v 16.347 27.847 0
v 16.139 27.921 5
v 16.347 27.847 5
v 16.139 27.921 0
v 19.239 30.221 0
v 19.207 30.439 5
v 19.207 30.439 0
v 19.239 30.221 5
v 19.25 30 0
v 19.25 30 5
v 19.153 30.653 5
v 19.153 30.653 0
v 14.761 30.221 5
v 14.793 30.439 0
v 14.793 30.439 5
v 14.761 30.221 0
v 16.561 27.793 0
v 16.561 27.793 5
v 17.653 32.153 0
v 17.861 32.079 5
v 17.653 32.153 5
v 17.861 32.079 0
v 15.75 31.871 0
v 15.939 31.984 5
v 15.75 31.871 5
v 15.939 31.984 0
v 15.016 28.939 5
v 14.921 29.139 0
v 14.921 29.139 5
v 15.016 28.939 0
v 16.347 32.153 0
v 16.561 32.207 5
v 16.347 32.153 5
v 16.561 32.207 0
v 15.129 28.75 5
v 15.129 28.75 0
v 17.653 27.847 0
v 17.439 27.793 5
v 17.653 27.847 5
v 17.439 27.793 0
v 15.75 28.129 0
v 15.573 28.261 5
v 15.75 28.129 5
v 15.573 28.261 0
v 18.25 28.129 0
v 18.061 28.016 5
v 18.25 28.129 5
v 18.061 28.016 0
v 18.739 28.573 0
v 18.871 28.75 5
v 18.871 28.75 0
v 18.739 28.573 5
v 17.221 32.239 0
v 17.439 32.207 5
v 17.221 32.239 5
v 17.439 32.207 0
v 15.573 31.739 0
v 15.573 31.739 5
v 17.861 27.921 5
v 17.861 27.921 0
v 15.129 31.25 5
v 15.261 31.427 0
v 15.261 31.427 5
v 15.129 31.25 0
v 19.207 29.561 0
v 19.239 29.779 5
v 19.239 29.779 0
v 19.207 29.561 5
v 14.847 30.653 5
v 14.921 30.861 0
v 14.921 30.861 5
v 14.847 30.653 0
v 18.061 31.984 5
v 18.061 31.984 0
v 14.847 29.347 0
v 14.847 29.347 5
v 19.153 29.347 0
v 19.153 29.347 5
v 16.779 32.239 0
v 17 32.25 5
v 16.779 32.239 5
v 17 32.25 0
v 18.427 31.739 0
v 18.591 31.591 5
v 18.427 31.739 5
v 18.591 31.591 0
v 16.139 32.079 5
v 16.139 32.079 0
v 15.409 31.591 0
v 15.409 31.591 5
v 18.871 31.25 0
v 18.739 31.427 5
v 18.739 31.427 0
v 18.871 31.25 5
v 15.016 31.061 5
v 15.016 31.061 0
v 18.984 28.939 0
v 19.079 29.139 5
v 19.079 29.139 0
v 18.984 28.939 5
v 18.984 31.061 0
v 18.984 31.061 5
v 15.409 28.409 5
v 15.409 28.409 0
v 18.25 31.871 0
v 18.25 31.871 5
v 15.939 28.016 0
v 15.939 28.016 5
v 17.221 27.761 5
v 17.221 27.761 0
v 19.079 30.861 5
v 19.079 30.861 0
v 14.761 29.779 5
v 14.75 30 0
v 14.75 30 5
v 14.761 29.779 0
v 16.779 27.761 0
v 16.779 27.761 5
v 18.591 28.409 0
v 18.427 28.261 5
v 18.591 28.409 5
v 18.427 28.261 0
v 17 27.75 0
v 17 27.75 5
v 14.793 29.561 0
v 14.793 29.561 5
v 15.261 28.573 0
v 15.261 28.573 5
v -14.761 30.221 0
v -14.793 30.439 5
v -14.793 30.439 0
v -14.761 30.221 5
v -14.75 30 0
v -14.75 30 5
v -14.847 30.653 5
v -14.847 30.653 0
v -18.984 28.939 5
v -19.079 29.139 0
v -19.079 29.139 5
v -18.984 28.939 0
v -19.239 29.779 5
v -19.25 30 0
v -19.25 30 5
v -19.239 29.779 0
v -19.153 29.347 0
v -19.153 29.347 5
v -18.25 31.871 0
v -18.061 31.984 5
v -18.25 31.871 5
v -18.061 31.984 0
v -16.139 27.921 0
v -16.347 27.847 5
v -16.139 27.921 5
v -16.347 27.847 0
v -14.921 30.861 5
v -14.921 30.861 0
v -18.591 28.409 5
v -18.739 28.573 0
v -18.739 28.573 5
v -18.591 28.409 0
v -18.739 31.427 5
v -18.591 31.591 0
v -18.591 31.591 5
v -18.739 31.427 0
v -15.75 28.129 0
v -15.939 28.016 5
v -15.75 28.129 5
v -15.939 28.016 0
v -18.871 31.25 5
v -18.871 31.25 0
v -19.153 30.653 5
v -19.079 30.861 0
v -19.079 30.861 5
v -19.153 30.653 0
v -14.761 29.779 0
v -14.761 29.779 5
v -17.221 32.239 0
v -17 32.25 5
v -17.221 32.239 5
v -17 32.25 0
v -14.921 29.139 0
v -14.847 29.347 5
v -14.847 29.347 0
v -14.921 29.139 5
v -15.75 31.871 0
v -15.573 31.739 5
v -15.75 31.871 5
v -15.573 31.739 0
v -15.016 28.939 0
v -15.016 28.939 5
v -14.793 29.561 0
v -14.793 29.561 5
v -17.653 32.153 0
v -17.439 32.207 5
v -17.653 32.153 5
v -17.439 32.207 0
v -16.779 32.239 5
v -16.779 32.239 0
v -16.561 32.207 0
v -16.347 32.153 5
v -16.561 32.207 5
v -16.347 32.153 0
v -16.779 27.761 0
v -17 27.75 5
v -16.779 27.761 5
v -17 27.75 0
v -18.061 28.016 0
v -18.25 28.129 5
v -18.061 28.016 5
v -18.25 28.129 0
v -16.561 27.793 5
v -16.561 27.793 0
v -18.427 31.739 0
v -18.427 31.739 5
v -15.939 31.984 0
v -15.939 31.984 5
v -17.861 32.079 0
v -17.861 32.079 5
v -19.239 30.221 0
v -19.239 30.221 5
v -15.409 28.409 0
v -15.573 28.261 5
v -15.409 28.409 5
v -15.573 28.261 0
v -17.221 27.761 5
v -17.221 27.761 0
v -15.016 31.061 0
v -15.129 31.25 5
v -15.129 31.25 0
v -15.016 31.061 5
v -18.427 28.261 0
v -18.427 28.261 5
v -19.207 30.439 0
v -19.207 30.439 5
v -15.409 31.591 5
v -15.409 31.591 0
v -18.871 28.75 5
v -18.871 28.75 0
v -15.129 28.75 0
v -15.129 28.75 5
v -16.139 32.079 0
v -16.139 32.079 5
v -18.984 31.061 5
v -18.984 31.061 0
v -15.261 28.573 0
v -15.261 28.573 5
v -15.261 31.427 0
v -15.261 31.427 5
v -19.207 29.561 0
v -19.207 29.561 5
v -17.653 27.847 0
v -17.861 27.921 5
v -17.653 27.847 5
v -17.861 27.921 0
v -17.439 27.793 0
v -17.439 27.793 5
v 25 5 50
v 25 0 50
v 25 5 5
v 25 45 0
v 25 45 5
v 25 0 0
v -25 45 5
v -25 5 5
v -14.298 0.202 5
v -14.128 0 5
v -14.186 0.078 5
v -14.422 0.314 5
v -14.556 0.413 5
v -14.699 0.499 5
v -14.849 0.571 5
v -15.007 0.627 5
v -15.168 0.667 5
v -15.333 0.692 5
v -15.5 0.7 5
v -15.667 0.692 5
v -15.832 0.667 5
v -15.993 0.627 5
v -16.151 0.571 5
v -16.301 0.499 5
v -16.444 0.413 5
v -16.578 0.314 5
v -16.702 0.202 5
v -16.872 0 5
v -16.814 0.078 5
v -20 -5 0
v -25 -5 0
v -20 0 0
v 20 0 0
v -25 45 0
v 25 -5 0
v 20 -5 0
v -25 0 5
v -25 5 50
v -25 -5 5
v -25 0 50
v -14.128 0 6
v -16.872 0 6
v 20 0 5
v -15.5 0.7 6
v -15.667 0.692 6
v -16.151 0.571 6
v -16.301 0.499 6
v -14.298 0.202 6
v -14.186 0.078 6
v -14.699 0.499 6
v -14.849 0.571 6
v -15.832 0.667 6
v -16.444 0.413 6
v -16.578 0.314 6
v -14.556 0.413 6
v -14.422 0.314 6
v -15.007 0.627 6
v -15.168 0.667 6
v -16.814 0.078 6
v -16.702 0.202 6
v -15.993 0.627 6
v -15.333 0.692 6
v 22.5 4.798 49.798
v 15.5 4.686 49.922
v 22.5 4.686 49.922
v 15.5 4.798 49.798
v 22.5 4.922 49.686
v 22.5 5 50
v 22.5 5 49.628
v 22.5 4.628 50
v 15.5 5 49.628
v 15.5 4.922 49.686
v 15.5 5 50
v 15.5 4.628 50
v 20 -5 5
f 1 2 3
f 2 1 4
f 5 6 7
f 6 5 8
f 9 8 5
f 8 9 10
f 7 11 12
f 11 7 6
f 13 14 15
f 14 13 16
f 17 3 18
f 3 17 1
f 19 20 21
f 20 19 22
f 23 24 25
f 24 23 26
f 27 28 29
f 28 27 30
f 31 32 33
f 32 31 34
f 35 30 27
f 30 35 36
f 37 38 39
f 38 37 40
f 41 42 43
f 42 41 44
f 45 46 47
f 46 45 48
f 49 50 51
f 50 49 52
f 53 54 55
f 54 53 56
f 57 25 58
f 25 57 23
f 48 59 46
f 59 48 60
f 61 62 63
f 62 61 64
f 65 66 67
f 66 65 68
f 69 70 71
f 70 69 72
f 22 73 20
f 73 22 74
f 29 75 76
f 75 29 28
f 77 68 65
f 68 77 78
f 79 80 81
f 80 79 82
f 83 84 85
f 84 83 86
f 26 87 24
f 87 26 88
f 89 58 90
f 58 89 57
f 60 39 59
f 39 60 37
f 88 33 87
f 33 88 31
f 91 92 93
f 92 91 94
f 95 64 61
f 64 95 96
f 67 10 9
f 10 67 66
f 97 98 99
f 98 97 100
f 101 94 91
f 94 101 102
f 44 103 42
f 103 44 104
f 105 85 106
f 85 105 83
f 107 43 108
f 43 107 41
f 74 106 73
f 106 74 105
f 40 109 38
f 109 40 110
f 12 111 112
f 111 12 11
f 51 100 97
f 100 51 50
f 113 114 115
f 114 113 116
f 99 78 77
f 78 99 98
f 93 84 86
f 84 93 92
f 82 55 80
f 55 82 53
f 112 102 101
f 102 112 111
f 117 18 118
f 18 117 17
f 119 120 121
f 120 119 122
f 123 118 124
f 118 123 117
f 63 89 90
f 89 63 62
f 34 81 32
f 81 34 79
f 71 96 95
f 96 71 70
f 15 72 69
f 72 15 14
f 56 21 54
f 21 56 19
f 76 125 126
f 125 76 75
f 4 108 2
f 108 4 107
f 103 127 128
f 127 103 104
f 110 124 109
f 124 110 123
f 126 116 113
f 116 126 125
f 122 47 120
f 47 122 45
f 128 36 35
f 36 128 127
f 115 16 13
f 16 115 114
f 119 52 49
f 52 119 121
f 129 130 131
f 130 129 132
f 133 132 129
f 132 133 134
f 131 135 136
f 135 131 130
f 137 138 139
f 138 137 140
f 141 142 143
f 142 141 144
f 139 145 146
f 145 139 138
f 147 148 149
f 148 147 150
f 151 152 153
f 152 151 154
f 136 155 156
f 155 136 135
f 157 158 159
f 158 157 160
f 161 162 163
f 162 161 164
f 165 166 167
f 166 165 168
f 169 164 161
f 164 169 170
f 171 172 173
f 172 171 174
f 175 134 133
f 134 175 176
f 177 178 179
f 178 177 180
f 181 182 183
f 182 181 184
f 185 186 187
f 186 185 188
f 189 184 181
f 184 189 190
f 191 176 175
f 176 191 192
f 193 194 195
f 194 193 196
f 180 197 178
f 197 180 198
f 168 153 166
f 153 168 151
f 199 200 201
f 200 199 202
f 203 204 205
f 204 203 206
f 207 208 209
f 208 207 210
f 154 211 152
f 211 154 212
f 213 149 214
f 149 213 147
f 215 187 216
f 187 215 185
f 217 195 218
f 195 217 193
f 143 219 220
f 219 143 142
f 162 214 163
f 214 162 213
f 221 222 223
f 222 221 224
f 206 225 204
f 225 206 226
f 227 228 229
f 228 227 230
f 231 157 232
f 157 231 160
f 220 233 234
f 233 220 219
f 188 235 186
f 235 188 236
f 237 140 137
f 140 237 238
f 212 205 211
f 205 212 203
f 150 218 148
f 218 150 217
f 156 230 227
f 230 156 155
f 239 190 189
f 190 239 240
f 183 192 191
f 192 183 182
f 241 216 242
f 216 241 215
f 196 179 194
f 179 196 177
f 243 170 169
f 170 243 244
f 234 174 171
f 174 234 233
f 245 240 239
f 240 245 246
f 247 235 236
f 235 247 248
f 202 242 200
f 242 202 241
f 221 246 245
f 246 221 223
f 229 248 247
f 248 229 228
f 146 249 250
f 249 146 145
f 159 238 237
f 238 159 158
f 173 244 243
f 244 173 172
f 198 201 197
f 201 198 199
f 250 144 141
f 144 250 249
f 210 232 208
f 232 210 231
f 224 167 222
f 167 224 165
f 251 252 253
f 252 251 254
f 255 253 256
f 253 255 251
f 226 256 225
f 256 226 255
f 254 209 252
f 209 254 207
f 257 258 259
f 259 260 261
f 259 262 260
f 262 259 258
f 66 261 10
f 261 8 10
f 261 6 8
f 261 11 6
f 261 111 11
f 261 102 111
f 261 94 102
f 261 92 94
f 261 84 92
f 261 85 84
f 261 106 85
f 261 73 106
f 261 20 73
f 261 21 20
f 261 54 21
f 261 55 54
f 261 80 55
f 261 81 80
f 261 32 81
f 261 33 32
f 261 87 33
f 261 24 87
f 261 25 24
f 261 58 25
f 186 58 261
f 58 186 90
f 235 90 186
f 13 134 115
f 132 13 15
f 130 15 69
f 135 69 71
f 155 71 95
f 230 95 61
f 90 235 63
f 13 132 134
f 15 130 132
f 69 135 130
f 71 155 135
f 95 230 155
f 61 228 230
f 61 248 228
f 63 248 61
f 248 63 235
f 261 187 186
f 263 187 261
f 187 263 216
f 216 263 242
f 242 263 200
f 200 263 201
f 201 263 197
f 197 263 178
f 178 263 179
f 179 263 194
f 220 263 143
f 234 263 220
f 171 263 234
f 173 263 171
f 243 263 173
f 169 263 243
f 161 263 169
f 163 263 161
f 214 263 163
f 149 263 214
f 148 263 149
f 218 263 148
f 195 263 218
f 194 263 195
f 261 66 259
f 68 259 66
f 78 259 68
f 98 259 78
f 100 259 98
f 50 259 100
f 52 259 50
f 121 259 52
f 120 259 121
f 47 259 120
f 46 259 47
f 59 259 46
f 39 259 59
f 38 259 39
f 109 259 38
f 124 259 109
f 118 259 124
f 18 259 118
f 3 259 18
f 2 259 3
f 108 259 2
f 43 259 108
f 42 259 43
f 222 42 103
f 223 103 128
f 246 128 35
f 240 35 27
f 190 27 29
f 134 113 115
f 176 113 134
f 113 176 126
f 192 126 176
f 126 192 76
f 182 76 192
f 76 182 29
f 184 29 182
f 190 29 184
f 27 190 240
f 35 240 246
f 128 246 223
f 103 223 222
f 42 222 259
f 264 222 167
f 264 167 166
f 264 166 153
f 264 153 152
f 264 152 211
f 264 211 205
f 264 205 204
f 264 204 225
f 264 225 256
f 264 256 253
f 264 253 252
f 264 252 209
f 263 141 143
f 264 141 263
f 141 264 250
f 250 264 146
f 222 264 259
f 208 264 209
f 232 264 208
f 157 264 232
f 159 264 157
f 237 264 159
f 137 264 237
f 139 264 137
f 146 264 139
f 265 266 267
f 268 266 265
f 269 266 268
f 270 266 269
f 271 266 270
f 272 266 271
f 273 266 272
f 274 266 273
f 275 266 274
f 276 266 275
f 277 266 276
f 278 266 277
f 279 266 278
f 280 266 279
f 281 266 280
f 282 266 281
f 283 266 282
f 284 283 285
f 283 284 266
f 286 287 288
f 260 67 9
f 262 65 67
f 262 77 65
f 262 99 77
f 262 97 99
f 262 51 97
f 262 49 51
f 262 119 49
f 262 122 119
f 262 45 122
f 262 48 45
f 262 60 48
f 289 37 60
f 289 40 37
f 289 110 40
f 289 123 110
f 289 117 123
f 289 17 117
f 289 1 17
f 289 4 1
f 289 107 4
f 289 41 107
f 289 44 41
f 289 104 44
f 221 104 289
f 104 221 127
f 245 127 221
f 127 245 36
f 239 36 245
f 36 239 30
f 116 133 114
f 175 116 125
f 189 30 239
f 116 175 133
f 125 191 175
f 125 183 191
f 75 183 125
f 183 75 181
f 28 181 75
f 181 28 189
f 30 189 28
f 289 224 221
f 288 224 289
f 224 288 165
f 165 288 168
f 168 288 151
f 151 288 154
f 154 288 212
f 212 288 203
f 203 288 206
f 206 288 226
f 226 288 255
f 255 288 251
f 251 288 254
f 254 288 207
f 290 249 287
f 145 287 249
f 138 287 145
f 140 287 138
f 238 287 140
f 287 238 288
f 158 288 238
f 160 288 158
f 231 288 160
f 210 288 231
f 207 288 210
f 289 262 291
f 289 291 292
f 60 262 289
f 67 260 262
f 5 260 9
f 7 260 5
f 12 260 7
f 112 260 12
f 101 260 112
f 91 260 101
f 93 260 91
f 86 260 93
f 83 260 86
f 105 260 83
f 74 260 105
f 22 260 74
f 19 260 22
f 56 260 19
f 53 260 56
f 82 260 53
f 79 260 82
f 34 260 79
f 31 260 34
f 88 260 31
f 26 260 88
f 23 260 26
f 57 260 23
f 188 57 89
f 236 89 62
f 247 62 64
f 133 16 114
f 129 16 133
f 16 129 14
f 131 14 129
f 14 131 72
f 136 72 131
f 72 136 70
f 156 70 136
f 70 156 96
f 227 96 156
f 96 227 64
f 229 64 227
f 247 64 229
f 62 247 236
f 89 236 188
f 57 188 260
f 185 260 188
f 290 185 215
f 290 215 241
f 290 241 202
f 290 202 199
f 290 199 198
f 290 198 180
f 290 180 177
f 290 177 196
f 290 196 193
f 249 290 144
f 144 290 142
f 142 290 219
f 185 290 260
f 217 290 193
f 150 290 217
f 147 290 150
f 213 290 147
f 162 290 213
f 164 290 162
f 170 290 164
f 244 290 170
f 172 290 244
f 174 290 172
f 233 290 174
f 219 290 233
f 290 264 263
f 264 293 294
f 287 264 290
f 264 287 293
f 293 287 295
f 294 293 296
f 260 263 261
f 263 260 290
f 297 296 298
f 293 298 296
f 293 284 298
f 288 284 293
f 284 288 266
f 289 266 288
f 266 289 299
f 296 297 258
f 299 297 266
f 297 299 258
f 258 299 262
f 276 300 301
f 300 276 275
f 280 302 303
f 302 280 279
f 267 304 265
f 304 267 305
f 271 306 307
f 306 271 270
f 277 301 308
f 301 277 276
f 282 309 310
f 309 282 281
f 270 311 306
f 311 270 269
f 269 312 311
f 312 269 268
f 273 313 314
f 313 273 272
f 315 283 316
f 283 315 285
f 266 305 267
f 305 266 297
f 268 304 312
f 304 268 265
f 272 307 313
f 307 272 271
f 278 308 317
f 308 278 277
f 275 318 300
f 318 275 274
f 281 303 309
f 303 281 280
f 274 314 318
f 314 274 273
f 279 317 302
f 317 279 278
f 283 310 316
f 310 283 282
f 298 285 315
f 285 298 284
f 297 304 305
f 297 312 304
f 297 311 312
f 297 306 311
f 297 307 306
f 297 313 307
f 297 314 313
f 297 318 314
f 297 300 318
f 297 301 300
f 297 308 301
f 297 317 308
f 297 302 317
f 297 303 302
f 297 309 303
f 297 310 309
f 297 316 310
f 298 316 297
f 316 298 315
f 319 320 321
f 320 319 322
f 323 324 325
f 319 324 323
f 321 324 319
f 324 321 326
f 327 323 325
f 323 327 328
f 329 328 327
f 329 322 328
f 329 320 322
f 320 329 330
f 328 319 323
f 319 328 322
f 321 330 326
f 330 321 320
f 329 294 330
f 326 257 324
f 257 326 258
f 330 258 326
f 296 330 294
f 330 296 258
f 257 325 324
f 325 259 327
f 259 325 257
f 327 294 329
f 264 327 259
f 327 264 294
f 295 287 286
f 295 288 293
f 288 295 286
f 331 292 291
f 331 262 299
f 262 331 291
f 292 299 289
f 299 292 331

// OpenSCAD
// L-shaped mounting bracket for NEMA 17 stepper motor
// Print orientation: base plate on bed (z = 0), motor plate builds upward (+Z)

// ---------------- Parameters ----------------
$fn = 64;

// Base plate
base_x0 = -25;    // base plate X start
base_x1 = 25;     // base plate X end
base_y0 = 0;      // base plate Y start
base_y1 = 45;     // base plate Y end
base_z0 = 0;      // base plate Z start
base_z1 = 5;      // base plate Z end
hole_m4_x = -17;  // M4 through-hole X position
hole_m4_y = 30;   // M4 through-hole Y position
hole_m4_d = 4.5;  // M4 through-hole diameter

// Motor plate
motor_x0 = -25;   // motor plate X start
motor_x1 = 25;    // motor plate X end
motor_y0 = 0;     // motor plate Y start
motor_y1 = 5;     // motor plate Y end
motor_z0 = 0;     // motor plate Z start
motor_z1 = 50;    // motor plate Z end
boss_d = 23;      // motor centring boss hole diameter
boss_x = 0;       // boss hole X centre
boss_z = 28;      // boss hole Z centre
screw_d = 3.4;    // M3 screw hole diameter
screw_p = 31;     // square pitch for screw holes
screw_n = 4;      // number of screw holes

// Gussets
gusset_t = 5;     // gusset thickness (along X)
gusset_y0 = 5;    // gusset leg along Y
gusset_z0 = 5;    // gusset leg along Z

// ---------------- Model ----------------
union() {
    // Base plate with M4 through-holes
    difference() {
        translate([base_x0, base_y0, base_z0])
            cube([base_x1 - base_x0, base_y1 - base_y0, base_z1 - base_z0]);
        for (sx = [-1, 1])
            translate([sx * hole_m4_x, hole_m4_y, -1])
                cylinder(d = hole_m4_d, h = base_z1 + 2);
    }

    // Motor plate with boss hole and M3 screw holes
    difference() {
        translate([motor_x0, motor_y0, motor_z0])
            cube([motor_x1 - motor_x0, motor_y1 - motor_y0, motor_z1 - motor_z0]);
        // Boss hole along Y
        translate([boss_x, -1, boss_z])
            rotate([90, 0, 0])
                cylinder(d = boss_d, h = motor_y1 - motor_y0 + 2);
        // Screw holes on square pattern
        for (i = [0 : screw_n - 1]) {
            a = (i < 2) ? 0 : 90;
            translate([
                (i < 2) ? -screw_p / 2 : screw_p / 2,
                (i < 2) ? -1 : motor_y1 + 1,
                (i % 2 == 0) ? -1 : motor_z1 + 1
            ])
                rotate([0, a, 0])
                    cylinder(d = screw_d, h = motor_y1 - motor_y0 + 2);
        }
    }

    // Left gusset (flush with left edge, x = -25 to -20)
    translate([-25, motor_y0, motor_z0])
        rotate([90, 0, 0])
            linear_extrude(height = gusset_t)
                polygon(points = [
                    [motor_y0, motor_z0],
                    [gusset_y0, motor_z0],
                    [motor_y0, gusset_z0]
                ]);

    // Right gusset (flush with right edge, x = 20 to 25)
    translate([20, motor_y0, motor_z0])
        rotate([90, 0, 0])
            linear_extrude(height = gusset_t)
                polygon(points = [
                    [motor_y0, motor_z0],
                    [gusset_y0, motor_z0],
                    [motor_y0, gusset_z0]
                ]);
}
